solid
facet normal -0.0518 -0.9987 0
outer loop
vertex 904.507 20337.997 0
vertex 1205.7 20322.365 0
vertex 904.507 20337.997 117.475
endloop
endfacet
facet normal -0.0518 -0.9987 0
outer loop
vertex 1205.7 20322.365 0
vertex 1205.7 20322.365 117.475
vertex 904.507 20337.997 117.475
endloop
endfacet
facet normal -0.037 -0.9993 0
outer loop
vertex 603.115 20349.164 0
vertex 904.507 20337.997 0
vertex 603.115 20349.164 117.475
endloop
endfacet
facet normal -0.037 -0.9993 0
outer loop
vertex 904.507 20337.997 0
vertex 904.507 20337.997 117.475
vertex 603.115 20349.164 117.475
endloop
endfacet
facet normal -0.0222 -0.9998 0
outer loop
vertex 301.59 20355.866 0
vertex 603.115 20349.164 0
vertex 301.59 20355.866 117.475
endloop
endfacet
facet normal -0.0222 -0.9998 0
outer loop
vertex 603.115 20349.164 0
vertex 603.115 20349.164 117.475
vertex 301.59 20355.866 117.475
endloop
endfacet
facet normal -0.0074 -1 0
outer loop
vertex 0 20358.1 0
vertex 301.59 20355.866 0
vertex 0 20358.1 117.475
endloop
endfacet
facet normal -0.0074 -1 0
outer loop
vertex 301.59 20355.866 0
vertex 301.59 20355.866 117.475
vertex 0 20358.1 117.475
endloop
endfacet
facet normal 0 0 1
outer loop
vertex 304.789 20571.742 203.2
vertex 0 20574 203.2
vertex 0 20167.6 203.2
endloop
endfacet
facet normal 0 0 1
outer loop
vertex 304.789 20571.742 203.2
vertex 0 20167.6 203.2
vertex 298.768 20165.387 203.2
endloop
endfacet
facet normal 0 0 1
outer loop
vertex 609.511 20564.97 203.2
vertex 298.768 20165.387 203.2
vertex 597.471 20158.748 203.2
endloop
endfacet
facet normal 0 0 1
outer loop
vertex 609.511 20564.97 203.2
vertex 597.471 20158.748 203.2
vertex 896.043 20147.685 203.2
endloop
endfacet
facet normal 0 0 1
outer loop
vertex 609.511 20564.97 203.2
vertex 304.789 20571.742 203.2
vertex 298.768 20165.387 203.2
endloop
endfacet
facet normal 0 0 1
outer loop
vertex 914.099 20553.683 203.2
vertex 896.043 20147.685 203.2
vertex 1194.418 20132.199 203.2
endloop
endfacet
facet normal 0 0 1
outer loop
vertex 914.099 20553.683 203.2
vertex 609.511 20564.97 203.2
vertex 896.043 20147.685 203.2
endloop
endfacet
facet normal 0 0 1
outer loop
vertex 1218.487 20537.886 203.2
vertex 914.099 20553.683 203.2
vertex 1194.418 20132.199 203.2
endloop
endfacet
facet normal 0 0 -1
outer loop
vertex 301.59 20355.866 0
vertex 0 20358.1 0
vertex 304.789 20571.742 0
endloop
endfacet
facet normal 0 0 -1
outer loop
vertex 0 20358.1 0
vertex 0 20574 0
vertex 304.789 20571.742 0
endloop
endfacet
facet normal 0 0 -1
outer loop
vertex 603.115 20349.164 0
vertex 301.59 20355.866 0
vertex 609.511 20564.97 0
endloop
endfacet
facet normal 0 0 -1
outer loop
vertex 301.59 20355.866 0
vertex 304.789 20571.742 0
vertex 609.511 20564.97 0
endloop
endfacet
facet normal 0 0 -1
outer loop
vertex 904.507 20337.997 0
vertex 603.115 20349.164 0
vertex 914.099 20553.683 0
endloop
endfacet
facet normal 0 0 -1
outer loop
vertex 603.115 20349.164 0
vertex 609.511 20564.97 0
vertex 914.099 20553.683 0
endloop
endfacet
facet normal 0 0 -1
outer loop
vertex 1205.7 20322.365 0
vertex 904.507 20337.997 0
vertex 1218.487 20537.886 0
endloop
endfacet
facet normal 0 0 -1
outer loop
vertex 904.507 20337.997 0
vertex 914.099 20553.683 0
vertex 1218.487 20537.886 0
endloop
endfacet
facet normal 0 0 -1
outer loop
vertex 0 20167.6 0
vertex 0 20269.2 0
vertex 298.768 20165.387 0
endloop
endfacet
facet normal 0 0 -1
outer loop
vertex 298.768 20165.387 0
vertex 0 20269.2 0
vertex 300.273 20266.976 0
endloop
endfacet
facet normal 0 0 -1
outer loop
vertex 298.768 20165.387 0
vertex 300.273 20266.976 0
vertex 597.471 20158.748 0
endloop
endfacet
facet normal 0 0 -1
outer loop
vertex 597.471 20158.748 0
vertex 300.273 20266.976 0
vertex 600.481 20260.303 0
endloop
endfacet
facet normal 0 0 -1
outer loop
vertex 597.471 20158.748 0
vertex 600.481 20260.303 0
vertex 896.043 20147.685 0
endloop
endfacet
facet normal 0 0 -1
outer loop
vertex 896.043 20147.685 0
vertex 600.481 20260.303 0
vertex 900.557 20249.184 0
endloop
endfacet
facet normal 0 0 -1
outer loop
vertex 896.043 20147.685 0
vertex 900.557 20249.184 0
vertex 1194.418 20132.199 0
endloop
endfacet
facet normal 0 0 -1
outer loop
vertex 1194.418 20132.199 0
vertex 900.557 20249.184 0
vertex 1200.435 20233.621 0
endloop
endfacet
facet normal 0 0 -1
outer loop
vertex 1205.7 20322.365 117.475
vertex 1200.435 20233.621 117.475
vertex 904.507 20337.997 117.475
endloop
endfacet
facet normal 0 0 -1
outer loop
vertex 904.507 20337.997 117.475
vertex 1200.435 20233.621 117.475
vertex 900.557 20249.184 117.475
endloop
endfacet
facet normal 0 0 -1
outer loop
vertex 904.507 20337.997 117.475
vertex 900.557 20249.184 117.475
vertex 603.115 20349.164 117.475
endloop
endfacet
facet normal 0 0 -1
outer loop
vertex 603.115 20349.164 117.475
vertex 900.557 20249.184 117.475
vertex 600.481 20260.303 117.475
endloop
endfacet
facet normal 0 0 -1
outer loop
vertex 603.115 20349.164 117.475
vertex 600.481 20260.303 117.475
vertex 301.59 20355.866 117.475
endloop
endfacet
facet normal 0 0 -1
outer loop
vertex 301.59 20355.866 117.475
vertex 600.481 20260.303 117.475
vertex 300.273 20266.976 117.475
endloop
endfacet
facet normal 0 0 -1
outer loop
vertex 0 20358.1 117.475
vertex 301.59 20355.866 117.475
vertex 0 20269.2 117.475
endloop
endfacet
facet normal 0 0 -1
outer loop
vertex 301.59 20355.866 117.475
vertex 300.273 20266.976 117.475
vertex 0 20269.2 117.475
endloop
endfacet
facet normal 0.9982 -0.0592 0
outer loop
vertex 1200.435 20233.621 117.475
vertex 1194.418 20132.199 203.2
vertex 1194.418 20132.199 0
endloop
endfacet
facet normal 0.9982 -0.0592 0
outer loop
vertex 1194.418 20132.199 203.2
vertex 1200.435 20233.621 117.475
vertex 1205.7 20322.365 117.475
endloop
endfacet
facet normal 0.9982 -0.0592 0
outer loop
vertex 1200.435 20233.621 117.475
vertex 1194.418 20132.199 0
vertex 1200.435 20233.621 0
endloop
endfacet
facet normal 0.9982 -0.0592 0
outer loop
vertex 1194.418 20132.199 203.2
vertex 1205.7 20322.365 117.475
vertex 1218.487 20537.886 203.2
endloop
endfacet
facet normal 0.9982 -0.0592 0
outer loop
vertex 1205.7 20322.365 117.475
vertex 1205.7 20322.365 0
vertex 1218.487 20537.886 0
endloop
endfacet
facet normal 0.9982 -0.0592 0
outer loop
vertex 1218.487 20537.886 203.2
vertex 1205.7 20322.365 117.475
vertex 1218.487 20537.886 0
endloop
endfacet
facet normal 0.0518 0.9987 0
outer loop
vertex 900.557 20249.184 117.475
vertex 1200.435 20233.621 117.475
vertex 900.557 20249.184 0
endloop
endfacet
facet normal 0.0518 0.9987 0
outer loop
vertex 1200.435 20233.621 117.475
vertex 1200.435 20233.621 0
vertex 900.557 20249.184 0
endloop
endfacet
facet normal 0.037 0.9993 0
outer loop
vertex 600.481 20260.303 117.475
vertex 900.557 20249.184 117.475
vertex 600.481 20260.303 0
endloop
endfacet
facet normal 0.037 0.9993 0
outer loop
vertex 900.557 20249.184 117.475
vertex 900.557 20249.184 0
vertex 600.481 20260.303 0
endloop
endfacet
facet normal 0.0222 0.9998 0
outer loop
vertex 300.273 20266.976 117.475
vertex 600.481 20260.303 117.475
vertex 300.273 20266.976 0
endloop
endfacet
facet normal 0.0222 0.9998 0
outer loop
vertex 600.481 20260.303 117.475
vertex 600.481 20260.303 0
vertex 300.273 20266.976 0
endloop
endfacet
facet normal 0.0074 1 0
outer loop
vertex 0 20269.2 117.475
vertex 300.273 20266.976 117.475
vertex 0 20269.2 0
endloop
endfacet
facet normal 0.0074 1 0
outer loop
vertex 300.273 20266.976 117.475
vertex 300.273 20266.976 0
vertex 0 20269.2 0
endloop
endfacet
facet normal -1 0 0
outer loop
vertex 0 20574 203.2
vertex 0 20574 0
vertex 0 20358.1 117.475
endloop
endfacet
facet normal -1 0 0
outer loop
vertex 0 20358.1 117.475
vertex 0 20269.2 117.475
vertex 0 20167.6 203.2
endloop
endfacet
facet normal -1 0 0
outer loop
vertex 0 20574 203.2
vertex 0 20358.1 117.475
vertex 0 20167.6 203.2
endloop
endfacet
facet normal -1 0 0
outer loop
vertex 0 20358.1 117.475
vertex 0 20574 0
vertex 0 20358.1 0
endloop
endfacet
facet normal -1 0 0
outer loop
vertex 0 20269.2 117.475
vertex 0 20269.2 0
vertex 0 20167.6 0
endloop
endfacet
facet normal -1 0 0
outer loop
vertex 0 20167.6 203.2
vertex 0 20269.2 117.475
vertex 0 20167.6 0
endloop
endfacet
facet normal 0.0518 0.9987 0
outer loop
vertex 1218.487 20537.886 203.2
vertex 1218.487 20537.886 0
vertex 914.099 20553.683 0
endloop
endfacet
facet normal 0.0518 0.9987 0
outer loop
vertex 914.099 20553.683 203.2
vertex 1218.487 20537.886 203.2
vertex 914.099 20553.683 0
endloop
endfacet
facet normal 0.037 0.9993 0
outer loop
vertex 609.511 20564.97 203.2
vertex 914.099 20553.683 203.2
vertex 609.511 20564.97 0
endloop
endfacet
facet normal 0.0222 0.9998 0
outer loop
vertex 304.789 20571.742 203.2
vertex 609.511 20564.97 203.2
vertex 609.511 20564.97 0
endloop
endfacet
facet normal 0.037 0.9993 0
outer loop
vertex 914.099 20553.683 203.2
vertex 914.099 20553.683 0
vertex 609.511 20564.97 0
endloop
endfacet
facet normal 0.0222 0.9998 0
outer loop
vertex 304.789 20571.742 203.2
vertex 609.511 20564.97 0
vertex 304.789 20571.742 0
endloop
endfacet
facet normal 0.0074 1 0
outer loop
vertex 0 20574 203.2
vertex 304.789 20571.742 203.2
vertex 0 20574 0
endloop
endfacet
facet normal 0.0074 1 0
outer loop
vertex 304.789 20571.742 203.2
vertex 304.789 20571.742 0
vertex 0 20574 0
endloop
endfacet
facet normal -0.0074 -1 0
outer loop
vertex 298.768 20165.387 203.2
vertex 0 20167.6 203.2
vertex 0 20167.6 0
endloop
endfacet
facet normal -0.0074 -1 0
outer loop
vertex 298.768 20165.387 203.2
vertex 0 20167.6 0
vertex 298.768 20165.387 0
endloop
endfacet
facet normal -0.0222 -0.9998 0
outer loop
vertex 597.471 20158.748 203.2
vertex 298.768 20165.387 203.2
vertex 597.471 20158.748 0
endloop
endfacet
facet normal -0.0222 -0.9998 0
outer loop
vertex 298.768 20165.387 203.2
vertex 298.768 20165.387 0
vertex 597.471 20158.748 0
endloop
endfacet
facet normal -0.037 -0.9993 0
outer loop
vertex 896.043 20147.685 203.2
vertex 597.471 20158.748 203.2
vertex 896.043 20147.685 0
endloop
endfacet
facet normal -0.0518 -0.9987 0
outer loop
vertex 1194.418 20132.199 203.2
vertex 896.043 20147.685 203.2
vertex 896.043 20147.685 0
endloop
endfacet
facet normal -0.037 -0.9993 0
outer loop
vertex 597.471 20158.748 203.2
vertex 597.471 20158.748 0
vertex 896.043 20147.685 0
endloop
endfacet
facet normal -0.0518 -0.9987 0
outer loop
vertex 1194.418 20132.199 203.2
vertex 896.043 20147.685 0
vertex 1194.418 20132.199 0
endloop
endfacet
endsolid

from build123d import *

# Parameters (mm, degrees)
F1_DEPTH = 203.2
F2_W     = 88.9
F2_H     = 117.475


with BuildPart() as f1:
    # F0 (on Top) → F1 (new body)
    with BuildSketch(Plane.XY):
        with BuildLine():
            Line((1194.4176857661, 20132.1994861945), (1218.4865560082, 20537.8861257148))
            ThreePointArc((1218.4865560082, 20537.8861257148), (609.5108077566, 20564.9695495818), (0, 20574))
            Line((0, 20574), (0, 20167.6))
            ThreePointArc((0, 20167.6), (597.4710880973, 20158.7479288493), (1194.4176857661, 20132.1994861945))
        make_face()
    extrude(amount=F1_DEPTH)

    # F4: sweep along a path in F3
    with BuildLine(Plane.XY) as f4_path:
        ThreePointArc((1200.4349033266, 20233.6211460746), (600.4810180121, 20260.3033340325), (0, 20269.2))
    # F2 (on face) → F4 (sweep, cut)
    with BuildSketch(Plane(origin=(0, 0, 0), x_dir=(0.0592245823, 0.9982446839, 0), z_dir=(0.9982446839, -0.0592245823, 0))):
        with Locations((20313.65, 58.7375)):
            Rectangle(F2_W, F2_H)
    sweep(path=f4_path.line, mode=Mode.SUBTRACT)


solid = f1.part
